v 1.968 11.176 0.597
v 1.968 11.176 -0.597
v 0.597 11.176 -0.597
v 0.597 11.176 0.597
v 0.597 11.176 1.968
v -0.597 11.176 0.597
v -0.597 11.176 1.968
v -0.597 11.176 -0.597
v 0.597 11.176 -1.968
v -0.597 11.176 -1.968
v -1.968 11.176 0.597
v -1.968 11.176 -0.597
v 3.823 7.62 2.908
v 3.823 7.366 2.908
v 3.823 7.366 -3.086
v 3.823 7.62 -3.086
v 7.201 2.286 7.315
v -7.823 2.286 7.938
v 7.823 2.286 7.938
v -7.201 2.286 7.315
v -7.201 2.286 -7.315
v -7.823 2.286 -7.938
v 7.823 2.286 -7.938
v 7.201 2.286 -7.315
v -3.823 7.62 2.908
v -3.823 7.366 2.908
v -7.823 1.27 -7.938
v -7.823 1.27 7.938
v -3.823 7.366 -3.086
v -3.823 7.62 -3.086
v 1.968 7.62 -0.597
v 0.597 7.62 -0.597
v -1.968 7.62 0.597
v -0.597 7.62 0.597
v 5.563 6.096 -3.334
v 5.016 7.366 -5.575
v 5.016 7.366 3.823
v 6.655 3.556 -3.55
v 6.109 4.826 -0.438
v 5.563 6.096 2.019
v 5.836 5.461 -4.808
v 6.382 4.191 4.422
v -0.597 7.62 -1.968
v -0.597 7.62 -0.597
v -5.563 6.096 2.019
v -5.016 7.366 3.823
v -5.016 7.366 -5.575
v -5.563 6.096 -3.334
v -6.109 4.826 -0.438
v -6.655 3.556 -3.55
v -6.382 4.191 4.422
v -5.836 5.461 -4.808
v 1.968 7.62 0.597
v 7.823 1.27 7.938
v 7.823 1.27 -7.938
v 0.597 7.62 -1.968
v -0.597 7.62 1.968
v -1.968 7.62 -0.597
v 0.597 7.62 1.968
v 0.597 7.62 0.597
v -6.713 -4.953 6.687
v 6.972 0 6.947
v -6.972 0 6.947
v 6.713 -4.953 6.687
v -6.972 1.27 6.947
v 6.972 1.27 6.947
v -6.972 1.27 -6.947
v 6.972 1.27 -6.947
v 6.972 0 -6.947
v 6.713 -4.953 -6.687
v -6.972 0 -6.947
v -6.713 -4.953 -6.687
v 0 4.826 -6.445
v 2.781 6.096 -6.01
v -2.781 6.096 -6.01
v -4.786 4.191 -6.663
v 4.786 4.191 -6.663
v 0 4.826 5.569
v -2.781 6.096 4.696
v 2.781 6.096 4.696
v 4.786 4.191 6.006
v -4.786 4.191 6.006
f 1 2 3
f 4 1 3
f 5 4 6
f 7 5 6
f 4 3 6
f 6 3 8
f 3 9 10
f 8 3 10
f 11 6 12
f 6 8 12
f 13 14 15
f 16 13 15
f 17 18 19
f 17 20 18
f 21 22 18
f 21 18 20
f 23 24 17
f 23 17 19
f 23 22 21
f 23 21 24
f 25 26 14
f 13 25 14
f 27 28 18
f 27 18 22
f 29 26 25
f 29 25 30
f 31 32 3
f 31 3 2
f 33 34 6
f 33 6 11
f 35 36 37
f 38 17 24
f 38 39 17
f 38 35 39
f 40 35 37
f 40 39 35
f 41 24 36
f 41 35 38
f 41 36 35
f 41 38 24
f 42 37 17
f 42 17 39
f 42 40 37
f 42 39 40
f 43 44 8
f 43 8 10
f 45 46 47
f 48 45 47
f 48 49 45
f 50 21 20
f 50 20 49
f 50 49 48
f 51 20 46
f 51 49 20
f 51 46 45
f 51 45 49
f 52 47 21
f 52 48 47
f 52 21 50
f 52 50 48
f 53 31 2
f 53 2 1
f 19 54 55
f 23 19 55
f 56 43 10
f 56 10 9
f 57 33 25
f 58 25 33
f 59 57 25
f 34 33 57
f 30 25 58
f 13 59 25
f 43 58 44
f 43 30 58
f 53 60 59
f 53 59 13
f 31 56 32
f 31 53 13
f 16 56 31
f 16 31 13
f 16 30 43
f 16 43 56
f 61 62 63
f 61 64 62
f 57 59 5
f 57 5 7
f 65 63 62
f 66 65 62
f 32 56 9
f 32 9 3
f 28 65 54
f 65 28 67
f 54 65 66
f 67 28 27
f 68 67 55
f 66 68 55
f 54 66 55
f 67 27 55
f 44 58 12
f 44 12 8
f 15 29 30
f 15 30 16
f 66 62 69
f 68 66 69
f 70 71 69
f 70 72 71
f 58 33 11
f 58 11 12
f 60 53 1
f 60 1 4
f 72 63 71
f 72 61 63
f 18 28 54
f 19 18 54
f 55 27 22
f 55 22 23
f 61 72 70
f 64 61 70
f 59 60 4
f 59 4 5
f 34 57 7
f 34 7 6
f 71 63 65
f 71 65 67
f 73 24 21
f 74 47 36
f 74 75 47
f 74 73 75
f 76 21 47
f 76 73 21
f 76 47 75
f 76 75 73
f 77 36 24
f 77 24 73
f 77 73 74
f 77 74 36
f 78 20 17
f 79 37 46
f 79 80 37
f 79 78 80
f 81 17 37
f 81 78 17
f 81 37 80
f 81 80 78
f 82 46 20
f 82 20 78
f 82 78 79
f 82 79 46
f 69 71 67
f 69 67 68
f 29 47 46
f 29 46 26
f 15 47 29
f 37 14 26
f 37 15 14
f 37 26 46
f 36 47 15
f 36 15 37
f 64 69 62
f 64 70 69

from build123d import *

# Parameters (mm, degrees)
SKETCH1_W           = 13.9446
SKETCH1_H           = 13.8938
BOSS_EXTRUDE1_DEPTH = 1.27
SKETCH2_W           = 15.6464
SKETCH2_H           = 15.875
BOSS_EXTRUDE2_DEPTH = 1.016
SKETCH6_W           = 7.6454
SKETCH6_H           = 5.9944
BOSS_EXTRUDE4_DEPTH = 0.254
BOSS_EXTRUDE5_DEPTH = 3.556
SKETCH8_W           = 13.9446
SKETCH8_H           = 13.8938
BOSS_EXTRUDE6_DEPTH = 4.953
BOSS_EXTRUDE6_TAPER = 3


with BuildPart() as part:
    # Sketch1 → Boss-Extrude1 (new body)
    with BuildSketch(Plane(origin=(0, 0, 0), x_dir=(1, 0, 0), z_dir=(0, 1, 0))):
        Rectangle(SKETCH1_W, SKETCH1_H)
    extrude(amount=BOSS_EXTRUDE1_DEPTH)

    # Sketch2 → Boss-Extrude2 (add)
    with BuildSketch(Plane(origin=(0, 1.27, 0), x_dir=(1, 0, 0), z_dir=(0, 1, 0))):
        Rectangle(SKETCH2_W, SKETCH2_H)
    extrude(amount=BOSS_EXTRUDE2_DEPTH)

    # Sketch4 → Loft1 section 0
    with BuildSketch(Plane(origin=(0, 7.366, 0), x_dir=(1, 0, 0), z_dir=(0, 1, 0))):
        with BuildLine():
            Line((-5.0165, 5.5753), (5.0165, 5.5753))
            Line((5.0165, 5.5753), (5.0165, -3.8227))
            Line((5.0165, -3.8227), (-5.0165, -3.8227))
            Line((-5.0165, -3.8227), (-5.0165, 5.5753))
        make_face()
    # Sketch3 → Loft1 section 1
    with BuildSketch(Plane(origin=(0, 2.286, 0), x_dir=(1, 0, 0), z_dir=(0, 1, 0))):
        with BuildLine():
            Line((-7.2009, -7.3152), (7.2009, -7.3152))
            Line((7.2009, -7.3152), (7.2009, 7.3152))
            Line((7.2009, 7.3152), (-7.2009, 7.3152))
            Line((-7.2009, 7.3152), (-7.2009, -7.3152))
        make_face()
    loft()

    # Sketch6 → Boss-Extrude4 (add)
    with BuildSketch(Plane(origin=(0, 7.366, 0), x_dir=(1, 0, 0), z_dir=(0, 1, 0))):
        with Locations((0, 0.0889)):
            Rectangle(SKETCH6_W, SKETCH6_H)
    extrude(amount=BOSS_EXTRUDE4_DEPTH)

    # Sketch7 → Boss-Extrude5 (add)
    with BuildSketch(Plane(origin=(0, 7.62, 0), x_dir=(1, 0, 0), z_dir=(0, 1, 0))):
        Polygon((-0.5969, 0.5969), (-0.5969, 1.9685), (0.5969, 1.9685), (0.5969, 0.5969), (1.9685, 0.5969), (1.9685, -0.5969), (0.5969, -0.5969), (0.5969, -1.9685), (-0.5969, -1.9685), (-0.5969, -0.5969), (-1.9685, -0.5969), (-1.9685, 0.5969), align=None)
    extrude(amount=BOSS_EXTRUDE5_DEPTH)

    # Sketch8 → Boss-Extrude6 (add)
    with BuildSketch(Plane.XZ):
        Rectangle(SKETCH8_W, SKETCH8_H)
    extrude(amount=BOSS_EXTRUDE6_DEPTH, taper=BOSS_EXTRUDE6_TAPER)


solid = part.part
